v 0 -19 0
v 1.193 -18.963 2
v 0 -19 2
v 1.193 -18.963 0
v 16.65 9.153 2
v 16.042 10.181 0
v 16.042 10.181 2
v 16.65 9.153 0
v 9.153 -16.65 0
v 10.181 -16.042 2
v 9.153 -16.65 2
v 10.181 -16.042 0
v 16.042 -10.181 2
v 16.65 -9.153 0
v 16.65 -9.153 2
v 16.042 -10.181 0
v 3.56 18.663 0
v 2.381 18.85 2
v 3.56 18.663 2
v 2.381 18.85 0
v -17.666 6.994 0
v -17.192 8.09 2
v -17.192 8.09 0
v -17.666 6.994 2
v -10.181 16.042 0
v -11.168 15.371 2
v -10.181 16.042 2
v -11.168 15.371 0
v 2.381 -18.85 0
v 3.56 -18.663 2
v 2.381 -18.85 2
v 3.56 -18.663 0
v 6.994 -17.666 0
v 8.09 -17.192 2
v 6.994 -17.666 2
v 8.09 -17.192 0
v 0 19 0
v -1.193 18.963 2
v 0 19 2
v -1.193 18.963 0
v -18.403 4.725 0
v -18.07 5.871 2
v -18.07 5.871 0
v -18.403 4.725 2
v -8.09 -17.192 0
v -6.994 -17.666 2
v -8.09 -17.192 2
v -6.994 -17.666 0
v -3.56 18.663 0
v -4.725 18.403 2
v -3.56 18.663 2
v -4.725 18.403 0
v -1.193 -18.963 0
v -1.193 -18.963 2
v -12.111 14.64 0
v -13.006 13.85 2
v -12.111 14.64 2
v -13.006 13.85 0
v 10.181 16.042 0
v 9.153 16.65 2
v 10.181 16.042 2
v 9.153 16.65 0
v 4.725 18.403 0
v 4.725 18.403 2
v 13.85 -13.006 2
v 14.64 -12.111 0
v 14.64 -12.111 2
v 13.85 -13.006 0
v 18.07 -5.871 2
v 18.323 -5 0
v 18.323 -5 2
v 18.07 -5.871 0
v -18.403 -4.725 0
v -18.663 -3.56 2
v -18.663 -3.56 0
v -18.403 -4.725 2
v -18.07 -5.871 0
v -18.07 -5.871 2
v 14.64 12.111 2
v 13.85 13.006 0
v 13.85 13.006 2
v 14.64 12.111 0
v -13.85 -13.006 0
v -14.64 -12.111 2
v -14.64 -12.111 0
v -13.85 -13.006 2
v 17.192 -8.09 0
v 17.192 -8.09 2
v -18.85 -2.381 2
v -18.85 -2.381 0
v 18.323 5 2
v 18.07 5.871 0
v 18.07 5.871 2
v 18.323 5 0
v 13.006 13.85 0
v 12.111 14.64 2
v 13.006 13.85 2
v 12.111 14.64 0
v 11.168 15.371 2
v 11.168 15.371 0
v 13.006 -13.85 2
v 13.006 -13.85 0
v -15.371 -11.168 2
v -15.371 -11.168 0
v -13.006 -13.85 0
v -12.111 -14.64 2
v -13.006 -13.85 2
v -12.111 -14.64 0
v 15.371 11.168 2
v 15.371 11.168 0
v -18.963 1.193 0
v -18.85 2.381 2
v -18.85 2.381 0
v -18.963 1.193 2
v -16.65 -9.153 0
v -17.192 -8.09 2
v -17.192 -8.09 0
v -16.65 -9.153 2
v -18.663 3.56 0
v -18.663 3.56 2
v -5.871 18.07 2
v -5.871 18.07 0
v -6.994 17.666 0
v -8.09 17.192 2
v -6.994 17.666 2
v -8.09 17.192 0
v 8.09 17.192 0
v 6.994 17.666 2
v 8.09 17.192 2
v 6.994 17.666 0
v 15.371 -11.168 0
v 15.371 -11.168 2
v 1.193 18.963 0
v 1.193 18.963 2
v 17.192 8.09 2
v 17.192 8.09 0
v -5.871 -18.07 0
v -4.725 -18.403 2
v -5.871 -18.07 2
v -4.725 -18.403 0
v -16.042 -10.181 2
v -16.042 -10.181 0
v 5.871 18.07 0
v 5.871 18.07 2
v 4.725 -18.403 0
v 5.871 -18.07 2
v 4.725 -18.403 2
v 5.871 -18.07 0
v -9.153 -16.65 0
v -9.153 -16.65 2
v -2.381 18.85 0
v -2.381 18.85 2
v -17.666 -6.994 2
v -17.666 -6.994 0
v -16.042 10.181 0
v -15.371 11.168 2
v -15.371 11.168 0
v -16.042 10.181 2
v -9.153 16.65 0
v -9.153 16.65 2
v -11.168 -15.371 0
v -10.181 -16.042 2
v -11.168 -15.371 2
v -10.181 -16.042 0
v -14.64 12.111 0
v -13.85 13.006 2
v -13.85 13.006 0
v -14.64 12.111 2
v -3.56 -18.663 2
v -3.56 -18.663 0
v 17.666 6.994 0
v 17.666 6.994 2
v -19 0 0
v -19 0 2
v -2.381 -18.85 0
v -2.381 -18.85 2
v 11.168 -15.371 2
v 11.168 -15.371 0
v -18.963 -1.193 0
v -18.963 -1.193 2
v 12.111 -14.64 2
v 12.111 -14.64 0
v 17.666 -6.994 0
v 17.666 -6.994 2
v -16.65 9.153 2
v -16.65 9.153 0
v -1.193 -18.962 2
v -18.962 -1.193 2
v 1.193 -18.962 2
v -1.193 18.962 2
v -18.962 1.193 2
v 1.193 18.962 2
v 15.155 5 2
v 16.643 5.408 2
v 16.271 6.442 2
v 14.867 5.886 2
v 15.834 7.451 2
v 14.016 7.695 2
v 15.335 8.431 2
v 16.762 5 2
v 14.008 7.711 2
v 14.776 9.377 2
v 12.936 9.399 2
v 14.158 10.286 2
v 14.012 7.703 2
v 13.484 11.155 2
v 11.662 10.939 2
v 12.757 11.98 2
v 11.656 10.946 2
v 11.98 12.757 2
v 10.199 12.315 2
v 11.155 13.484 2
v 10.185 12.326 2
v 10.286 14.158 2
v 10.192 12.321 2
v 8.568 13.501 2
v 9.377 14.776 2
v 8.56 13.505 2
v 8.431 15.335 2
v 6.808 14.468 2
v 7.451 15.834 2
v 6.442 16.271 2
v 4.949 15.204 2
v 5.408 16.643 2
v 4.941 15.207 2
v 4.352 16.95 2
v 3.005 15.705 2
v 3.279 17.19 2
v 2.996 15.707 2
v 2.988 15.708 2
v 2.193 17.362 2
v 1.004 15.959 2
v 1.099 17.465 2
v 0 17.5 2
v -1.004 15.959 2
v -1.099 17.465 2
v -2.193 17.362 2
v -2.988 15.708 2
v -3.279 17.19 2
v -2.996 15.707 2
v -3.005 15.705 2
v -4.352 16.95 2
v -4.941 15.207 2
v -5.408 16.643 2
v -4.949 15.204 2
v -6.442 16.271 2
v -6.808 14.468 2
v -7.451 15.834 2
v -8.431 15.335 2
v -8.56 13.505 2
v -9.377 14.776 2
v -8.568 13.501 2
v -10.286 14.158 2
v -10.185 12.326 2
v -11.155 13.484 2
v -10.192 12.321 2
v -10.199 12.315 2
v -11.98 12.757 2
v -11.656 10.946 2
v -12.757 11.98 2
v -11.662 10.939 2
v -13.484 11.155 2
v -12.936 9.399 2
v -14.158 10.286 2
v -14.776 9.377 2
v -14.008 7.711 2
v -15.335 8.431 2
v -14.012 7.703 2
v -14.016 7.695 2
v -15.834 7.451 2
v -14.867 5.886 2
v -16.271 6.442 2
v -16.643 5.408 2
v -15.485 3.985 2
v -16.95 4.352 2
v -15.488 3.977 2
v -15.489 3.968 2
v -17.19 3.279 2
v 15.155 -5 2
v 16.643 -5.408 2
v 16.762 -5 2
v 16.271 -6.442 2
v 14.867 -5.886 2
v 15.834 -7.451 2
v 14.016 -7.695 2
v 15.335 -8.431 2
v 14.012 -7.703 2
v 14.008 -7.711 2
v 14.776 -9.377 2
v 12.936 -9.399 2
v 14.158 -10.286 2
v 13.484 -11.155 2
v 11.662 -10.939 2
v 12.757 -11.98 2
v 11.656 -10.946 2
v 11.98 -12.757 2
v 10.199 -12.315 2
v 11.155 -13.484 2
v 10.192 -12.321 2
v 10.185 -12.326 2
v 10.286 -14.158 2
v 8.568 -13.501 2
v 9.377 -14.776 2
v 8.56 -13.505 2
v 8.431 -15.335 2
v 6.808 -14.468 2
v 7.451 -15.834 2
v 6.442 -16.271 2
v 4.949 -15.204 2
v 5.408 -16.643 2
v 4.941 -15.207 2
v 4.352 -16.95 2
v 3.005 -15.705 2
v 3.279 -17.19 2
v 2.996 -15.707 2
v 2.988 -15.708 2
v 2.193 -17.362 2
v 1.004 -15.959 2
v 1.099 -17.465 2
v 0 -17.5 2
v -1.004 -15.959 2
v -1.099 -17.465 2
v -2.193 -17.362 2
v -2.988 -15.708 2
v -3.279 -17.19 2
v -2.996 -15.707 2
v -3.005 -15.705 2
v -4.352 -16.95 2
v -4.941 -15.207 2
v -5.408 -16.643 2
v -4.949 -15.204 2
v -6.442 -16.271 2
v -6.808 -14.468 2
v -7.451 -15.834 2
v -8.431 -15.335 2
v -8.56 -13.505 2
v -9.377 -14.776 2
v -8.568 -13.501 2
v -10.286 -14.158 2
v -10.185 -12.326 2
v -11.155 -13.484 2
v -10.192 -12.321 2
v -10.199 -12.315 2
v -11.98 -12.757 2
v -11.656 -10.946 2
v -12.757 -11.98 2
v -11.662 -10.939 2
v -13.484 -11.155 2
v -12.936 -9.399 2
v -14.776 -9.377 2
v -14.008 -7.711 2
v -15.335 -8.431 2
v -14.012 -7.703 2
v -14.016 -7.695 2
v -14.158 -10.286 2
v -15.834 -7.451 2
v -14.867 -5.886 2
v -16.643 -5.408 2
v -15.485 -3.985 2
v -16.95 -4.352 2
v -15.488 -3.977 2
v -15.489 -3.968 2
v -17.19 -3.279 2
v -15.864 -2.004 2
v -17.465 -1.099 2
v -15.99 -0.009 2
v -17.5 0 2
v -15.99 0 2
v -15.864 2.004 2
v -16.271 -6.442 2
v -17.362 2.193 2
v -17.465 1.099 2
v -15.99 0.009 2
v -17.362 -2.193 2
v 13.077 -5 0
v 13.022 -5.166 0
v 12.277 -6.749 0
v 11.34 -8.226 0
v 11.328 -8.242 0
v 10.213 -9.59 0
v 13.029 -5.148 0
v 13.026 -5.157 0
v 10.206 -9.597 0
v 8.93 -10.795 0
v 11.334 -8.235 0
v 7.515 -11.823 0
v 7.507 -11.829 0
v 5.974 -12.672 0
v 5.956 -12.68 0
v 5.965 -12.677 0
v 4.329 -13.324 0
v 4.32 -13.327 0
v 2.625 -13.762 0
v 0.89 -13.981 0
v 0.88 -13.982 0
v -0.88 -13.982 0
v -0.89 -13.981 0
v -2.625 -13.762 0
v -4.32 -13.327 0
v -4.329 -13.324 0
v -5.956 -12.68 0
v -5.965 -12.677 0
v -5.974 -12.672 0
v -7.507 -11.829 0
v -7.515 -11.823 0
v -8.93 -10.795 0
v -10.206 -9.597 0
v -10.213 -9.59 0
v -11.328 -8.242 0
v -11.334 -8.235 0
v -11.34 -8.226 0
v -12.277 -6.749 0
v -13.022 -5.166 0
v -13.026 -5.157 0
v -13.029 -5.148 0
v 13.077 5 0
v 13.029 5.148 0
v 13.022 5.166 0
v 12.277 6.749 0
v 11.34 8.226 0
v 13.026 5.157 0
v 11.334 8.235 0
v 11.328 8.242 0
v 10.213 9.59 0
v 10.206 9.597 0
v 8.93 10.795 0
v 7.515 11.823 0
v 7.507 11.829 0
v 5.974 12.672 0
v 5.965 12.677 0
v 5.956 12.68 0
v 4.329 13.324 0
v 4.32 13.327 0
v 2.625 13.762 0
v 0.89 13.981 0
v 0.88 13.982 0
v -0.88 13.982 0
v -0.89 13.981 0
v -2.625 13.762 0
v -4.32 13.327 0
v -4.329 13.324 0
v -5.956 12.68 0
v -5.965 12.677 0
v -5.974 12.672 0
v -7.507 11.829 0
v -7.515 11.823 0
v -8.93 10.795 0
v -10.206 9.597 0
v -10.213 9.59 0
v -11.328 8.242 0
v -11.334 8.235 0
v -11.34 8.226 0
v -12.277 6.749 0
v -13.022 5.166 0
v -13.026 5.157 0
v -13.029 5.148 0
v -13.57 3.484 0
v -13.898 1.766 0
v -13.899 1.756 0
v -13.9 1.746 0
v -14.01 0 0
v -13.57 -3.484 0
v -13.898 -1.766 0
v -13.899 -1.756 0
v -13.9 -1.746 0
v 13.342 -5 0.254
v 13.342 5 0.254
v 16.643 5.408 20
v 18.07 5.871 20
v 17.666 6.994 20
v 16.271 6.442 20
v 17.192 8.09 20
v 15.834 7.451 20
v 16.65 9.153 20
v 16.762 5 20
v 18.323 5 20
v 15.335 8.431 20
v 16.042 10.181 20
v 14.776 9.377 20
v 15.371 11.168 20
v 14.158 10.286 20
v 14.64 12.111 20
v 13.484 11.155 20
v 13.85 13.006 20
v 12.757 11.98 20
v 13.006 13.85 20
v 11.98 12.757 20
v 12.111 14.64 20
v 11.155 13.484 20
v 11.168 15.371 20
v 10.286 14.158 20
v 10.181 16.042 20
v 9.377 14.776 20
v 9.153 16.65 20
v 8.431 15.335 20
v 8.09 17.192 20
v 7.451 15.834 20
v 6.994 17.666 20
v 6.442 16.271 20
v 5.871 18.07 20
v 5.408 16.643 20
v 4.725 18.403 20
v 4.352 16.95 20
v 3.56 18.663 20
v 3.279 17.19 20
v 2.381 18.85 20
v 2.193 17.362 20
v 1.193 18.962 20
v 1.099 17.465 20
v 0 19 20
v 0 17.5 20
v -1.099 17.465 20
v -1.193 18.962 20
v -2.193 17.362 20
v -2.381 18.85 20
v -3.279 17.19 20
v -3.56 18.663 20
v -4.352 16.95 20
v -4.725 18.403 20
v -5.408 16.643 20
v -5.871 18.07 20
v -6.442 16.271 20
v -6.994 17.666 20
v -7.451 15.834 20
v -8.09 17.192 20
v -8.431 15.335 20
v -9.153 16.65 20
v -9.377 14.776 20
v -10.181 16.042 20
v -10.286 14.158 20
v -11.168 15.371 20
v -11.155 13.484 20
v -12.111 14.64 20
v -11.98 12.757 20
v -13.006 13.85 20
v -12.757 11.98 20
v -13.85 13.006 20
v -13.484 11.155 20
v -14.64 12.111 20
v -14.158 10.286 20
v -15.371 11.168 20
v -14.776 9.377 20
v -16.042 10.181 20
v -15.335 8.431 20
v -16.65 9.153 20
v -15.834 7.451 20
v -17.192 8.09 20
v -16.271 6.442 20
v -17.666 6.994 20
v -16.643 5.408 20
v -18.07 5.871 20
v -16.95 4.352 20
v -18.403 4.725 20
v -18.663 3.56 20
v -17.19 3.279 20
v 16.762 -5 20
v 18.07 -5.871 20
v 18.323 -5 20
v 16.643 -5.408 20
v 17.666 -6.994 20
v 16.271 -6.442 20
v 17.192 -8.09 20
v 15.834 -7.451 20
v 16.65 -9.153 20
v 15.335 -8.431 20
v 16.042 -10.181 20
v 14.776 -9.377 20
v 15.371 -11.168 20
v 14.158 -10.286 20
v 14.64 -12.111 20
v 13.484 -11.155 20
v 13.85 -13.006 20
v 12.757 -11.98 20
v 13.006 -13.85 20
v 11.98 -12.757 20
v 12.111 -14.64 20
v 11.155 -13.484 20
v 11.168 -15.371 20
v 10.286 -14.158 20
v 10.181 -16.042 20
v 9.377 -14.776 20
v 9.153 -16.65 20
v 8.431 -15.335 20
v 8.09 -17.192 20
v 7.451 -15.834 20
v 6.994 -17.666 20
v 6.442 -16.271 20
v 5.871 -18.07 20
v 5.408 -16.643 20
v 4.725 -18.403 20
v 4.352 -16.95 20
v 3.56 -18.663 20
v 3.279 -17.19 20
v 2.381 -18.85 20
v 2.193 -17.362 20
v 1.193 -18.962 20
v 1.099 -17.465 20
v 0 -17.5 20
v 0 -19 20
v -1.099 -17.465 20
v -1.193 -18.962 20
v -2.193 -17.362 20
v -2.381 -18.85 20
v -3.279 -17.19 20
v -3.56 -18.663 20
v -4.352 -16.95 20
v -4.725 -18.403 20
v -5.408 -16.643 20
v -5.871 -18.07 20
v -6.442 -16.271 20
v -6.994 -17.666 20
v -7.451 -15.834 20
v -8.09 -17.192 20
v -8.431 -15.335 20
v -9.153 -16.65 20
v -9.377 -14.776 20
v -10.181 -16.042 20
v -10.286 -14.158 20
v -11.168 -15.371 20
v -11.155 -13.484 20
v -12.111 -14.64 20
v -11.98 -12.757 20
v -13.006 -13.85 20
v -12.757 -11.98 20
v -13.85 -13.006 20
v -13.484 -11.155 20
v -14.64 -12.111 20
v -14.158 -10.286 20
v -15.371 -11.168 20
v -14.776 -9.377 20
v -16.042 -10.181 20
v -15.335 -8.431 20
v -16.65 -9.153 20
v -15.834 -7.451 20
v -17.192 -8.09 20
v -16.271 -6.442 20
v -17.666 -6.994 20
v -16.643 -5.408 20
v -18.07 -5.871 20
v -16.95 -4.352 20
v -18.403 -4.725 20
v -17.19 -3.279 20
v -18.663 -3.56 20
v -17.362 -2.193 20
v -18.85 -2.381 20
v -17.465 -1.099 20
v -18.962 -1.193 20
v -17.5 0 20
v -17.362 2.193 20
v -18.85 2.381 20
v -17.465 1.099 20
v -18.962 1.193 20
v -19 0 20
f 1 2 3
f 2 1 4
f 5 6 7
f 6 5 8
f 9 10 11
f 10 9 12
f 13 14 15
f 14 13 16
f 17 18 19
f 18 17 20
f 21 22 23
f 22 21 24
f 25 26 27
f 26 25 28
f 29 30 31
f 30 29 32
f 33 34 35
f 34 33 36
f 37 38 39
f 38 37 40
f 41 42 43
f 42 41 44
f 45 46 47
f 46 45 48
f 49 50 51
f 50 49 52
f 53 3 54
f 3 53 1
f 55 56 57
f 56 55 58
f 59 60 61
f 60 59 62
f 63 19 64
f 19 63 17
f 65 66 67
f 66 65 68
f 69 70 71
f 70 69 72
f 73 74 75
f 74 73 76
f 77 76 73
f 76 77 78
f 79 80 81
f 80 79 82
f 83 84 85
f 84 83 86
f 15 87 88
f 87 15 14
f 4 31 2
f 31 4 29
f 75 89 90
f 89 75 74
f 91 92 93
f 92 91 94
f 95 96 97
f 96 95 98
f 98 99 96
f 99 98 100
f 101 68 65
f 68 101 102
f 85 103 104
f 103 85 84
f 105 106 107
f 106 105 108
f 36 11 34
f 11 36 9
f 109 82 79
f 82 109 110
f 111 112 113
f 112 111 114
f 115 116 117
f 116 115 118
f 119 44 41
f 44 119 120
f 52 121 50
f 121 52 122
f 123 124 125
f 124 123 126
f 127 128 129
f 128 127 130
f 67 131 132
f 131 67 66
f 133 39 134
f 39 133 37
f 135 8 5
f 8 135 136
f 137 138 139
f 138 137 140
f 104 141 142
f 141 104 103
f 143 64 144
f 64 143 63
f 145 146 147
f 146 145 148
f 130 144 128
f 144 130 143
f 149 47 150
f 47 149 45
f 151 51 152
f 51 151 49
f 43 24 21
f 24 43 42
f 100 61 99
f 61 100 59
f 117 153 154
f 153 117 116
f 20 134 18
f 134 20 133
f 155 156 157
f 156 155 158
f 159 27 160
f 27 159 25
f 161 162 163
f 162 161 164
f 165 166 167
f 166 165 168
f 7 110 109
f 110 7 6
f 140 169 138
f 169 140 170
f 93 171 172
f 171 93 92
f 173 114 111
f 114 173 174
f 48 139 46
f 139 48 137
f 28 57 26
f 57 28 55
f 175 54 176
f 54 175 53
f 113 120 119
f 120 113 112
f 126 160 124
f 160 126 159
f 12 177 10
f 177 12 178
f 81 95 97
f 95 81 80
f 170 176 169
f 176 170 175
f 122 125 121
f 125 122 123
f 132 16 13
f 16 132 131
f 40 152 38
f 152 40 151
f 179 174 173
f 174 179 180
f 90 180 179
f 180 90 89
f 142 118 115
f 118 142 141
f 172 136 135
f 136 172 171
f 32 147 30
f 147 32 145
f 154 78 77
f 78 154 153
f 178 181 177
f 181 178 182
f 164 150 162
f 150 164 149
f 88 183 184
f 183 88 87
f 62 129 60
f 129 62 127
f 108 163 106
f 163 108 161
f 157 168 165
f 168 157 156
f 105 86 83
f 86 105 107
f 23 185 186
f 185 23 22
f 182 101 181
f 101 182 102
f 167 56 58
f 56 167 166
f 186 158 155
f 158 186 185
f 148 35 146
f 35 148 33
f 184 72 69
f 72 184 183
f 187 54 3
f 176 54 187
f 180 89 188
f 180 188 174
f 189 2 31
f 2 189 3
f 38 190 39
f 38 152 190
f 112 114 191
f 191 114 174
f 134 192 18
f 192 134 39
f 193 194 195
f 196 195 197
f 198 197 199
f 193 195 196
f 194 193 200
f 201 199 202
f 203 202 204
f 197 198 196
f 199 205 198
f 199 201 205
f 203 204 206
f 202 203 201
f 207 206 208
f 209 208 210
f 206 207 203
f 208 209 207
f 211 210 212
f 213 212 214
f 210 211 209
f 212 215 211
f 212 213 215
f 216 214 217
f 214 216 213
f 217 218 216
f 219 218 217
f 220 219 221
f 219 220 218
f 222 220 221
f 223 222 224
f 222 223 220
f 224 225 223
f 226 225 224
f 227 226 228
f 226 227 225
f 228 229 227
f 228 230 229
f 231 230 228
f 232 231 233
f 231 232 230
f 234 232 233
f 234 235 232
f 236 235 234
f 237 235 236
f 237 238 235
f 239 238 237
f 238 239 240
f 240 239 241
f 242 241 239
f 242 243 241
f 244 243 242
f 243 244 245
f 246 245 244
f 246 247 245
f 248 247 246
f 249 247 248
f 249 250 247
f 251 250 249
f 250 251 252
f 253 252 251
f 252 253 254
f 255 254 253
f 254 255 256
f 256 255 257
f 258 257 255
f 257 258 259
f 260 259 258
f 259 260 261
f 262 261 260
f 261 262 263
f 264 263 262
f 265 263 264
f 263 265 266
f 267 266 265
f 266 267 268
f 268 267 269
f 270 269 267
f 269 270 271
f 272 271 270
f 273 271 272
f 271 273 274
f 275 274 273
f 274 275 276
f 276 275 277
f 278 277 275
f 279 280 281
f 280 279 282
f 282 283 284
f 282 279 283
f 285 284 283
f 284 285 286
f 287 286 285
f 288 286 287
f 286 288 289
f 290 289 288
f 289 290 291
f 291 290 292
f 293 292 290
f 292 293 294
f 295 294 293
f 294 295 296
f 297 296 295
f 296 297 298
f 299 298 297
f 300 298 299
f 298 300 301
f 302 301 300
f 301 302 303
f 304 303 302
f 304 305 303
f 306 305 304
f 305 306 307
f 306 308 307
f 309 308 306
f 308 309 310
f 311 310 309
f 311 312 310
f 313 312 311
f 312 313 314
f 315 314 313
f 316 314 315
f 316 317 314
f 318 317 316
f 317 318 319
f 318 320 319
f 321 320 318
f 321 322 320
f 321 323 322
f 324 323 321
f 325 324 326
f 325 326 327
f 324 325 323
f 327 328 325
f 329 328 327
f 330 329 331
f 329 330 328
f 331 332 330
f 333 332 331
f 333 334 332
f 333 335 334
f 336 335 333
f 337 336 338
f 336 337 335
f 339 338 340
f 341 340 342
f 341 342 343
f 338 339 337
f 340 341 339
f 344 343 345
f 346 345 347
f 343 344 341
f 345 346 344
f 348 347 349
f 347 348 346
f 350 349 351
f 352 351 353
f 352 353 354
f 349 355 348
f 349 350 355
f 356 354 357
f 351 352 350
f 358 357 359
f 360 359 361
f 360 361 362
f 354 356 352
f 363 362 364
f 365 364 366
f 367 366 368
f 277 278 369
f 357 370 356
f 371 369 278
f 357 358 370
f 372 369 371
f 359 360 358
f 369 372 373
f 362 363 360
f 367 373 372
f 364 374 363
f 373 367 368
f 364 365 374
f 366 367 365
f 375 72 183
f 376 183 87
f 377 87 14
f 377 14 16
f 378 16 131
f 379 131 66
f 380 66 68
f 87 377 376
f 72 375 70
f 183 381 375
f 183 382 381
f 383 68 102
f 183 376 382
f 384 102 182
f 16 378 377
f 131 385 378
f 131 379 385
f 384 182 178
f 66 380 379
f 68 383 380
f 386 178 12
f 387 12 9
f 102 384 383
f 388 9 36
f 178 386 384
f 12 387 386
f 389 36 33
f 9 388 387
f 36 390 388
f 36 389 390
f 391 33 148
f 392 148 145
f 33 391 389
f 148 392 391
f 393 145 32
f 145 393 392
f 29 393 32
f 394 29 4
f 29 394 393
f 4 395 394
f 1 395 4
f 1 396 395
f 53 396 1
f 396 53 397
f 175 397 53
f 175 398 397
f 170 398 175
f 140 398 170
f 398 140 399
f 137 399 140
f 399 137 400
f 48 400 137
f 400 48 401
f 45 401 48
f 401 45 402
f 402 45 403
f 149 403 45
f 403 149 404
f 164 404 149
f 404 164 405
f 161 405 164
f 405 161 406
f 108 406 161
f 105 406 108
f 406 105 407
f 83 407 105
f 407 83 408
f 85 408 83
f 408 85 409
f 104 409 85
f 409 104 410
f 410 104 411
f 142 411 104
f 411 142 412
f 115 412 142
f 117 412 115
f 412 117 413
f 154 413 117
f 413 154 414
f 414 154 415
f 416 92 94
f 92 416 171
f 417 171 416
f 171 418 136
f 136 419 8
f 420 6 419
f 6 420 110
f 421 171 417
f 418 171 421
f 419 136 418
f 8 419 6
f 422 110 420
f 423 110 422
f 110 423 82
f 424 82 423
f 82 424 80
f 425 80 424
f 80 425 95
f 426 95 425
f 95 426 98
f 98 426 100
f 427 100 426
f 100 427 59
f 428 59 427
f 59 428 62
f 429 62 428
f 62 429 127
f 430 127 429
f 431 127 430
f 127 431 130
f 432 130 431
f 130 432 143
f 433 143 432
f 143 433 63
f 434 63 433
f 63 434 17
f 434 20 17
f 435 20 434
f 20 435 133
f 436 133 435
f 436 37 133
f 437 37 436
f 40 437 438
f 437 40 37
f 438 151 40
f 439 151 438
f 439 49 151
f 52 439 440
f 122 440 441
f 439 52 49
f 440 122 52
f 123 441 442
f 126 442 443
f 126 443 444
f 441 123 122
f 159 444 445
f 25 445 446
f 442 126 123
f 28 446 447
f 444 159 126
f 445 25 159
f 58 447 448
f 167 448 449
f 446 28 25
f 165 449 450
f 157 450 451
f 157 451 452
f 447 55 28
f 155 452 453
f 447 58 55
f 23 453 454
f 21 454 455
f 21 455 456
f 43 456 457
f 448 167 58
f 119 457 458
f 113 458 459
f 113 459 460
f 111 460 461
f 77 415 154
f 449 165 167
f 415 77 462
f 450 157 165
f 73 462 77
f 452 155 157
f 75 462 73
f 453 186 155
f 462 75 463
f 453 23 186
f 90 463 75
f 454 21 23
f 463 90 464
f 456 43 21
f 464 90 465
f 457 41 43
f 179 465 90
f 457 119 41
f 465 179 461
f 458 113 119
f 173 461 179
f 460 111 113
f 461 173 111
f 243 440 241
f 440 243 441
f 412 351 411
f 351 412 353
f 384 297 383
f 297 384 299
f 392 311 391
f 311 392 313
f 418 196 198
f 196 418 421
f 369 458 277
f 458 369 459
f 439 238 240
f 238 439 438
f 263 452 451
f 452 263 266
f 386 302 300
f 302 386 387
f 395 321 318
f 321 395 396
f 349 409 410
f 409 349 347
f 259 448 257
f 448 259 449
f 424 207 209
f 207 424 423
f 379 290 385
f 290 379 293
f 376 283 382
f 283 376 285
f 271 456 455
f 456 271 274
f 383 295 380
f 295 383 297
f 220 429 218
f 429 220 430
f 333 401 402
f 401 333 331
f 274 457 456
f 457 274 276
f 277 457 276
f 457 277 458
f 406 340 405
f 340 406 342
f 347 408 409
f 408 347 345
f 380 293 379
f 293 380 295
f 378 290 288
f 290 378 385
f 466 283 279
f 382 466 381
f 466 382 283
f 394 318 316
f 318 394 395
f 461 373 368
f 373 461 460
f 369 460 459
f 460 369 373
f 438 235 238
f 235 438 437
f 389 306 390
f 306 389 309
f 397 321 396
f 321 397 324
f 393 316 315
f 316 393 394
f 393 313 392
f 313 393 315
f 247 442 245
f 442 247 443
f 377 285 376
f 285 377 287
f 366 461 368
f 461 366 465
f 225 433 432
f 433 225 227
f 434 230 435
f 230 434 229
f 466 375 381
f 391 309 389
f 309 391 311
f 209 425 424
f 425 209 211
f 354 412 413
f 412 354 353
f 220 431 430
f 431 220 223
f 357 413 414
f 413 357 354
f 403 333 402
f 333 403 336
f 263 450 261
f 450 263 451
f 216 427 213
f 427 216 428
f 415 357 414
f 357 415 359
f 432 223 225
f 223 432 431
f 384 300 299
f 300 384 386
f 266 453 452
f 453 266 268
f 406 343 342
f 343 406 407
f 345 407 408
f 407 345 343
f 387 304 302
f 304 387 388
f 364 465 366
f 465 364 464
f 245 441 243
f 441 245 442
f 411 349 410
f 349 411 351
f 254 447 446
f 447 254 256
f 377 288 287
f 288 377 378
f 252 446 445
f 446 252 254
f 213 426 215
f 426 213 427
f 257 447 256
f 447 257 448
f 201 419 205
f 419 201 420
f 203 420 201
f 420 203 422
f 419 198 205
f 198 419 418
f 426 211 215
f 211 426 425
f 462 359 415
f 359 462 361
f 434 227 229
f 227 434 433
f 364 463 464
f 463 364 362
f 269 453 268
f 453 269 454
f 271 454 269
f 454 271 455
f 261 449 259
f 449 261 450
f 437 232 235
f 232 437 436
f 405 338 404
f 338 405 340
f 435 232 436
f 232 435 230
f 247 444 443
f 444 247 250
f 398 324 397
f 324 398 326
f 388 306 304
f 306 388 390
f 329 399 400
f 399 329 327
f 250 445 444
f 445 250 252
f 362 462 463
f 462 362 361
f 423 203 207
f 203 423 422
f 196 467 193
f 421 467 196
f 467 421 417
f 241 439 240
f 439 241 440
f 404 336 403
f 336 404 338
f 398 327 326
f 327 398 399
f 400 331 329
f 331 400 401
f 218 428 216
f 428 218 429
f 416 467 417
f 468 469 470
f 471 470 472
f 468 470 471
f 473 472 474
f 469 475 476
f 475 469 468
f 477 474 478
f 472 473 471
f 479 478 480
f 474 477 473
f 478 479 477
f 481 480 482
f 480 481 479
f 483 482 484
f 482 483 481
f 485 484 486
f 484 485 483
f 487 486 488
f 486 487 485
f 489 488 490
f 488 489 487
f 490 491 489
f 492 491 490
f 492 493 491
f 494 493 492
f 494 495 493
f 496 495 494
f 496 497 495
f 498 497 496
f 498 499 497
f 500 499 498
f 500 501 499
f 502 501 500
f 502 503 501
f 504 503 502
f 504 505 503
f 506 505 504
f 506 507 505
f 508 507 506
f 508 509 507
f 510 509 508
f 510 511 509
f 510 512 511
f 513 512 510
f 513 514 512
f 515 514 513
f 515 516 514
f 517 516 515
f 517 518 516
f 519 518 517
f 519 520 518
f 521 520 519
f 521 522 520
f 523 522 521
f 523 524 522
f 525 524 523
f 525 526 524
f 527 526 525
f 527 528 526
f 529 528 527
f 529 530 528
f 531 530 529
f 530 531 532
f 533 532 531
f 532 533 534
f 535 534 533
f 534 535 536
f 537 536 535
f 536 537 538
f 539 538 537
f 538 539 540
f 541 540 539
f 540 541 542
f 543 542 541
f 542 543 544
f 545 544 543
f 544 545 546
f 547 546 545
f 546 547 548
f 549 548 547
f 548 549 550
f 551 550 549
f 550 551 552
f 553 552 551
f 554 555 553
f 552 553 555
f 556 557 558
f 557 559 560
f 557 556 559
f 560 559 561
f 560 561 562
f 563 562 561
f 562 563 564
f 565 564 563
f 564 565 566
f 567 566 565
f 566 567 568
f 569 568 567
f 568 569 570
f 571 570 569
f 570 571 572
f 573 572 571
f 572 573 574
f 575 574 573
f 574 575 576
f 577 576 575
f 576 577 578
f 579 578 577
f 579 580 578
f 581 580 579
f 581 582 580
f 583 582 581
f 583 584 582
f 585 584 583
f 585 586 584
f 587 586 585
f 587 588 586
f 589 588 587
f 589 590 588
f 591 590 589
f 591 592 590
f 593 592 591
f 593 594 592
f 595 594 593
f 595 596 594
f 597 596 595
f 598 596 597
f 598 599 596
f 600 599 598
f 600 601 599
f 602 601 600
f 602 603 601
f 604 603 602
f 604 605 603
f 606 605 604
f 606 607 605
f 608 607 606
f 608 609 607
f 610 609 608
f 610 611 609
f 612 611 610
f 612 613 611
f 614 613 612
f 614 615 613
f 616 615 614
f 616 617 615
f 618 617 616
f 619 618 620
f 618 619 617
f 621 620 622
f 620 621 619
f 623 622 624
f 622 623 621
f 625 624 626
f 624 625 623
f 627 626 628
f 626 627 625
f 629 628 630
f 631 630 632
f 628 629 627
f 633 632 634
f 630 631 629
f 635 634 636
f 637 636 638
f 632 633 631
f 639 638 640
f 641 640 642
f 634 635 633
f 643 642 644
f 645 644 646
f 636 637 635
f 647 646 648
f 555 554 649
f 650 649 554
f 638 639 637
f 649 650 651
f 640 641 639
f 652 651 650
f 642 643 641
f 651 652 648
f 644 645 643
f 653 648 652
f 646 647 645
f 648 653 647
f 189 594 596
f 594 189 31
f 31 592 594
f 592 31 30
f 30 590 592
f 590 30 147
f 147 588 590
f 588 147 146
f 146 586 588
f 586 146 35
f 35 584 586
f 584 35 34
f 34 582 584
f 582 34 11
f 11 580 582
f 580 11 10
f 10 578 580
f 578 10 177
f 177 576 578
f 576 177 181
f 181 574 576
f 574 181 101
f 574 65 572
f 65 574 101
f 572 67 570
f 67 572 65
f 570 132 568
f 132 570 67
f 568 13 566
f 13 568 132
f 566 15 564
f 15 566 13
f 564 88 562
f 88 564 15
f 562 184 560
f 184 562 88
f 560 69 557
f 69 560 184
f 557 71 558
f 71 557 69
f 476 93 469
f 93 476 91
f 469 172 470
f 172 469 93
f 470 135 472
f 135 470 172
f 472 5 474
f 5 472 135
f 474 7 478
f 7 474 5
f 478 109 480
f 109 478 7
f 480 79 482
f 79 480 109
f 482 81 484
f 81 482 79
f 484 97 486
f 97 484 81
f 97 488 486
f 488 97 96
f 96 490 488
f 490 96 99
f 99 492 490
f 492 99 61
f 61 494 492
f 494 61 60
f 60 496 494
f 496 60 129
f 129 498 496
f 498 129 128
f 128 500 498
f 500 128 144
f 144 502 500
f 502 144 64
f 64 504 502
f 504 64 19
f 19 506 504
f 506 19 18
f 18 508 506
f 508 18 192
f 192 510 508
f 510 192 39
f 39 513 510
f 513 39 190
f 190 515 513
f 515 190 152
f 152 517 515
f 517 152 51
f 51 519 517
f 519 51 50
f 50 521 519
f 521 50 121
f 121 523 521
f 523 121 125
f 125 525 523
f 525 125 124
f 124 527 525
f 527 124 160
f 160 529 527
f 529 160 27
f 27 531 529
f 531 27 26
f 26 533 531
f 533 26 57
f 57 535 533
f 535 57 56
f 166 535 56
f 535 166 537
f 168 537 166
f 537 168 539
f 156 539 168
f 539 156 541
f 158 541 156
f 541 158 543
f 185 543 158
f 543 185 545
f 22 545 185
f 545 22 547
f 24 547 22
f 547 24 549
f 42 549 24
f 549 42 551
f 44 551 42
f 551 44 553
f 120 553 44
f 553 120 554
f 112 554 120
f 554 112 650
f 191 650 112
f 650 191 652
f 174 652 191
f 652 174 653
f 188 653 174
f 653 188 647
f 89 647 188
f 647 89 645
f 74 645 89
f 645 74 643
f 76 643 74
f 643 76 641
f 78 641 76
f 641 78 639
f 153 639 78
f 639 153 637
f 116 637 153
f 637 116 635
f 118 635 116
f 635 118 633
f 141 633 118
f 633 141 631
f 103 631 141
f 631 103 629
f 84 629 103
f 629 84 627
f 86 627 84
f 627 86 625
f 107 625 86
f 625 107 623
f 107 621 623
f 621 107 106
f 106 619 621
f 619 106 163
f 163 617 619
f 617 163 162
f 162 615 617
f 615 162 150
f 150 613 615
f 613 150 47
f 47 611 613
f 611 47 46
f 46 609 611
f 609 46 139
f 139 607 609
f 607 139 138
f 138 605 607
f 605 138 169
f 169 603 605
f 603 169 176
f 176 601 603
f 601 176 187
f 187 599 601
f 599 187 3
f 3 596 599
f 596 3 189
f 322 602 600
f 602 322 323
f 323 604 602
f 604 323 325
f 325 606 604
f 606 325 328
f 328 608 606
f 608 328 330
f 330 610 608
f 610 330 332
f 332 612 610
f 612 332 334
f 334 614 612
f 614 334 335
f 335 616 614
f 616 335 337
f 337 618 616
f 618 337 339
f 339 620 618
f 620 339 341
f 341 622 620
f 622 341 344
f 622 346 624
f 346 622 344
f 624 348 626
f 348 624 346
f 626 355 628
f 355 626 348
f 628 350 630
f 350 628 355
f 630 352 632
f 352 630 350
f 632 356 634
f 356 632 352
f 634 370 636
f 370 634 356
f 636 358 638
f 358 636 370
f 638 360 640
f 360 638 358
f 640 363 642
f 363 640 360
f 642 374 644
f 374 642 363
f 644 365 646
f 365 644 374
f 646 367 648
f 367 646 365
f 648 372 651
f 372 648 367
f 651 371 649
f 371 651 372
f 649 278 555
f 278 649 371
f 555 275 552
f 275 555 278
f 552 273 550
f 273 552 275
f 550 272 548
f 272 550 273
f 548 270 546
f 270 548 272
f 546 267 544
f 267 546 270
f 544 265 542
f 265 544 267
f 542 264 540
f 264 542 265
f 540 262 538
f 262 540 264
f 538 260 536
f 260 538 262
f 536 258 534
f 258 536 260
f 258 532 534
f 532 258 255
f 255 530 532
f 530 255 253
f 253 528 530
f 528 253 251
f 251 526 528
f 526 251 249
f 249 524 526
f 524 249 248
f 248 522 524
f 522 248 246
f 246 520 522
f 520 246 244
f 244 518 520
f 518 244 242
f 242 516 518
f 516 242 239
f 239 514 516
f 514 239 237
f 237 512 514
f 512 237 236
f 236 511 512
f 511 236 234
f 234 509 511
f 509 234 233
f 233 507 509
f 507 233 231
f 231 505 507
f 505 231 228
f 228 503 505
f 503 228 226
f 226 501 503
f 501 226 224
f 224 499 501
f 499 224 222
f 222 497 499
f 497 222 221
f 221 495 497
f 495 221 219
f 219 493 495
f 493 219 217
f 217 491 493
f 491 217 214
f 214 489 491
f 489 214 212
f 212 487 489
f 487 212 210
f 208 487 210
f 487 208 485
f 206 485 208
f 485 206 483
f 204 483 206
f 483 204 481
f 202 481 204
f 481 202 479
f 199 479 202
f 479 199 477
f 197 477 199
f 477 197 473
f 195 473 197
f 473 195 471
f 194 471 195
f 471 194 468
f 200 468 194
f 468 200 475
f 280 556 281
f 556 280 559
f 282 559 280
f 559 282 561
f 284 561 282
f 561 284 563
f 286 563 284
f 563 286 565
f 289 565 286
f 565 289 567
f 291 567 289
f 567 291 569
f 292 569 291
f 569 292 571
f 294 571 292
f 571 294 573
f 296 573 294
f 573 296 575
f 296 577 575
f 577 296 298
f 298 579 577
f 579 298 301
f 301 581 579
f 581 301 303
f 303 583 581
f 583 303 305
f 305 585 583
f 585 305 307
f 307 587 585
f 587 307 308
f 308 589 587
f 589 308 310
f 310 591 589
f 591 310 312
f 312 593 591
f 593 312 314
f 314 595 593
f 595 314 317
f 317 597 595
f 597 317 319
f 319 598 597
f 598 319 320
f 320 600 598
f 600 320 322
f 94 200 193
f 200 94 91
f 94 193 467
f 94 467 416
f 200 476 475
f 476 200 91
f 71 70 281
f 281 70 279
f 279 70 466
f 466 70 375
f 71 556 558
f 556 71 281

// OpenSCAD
id=35;
t=.375*4;
od=id+t*2;
h=20;
echo(str("OD: ",od));
difference() { union() {
difference(){
  cylinder(d=od,h=2,$fn=100);
  translate([0,0,-.01]) cylinder(d1=28,d2=32,h=2.02,$fn=50);
}
linear_extrude(h,convexity=3) difference() {
  circle(d=od,$fn=100);
  circle(d=id,$fn=100);
}
}
  translate([0,-5,-.01]) cube([30,10,h+.02]);
}
